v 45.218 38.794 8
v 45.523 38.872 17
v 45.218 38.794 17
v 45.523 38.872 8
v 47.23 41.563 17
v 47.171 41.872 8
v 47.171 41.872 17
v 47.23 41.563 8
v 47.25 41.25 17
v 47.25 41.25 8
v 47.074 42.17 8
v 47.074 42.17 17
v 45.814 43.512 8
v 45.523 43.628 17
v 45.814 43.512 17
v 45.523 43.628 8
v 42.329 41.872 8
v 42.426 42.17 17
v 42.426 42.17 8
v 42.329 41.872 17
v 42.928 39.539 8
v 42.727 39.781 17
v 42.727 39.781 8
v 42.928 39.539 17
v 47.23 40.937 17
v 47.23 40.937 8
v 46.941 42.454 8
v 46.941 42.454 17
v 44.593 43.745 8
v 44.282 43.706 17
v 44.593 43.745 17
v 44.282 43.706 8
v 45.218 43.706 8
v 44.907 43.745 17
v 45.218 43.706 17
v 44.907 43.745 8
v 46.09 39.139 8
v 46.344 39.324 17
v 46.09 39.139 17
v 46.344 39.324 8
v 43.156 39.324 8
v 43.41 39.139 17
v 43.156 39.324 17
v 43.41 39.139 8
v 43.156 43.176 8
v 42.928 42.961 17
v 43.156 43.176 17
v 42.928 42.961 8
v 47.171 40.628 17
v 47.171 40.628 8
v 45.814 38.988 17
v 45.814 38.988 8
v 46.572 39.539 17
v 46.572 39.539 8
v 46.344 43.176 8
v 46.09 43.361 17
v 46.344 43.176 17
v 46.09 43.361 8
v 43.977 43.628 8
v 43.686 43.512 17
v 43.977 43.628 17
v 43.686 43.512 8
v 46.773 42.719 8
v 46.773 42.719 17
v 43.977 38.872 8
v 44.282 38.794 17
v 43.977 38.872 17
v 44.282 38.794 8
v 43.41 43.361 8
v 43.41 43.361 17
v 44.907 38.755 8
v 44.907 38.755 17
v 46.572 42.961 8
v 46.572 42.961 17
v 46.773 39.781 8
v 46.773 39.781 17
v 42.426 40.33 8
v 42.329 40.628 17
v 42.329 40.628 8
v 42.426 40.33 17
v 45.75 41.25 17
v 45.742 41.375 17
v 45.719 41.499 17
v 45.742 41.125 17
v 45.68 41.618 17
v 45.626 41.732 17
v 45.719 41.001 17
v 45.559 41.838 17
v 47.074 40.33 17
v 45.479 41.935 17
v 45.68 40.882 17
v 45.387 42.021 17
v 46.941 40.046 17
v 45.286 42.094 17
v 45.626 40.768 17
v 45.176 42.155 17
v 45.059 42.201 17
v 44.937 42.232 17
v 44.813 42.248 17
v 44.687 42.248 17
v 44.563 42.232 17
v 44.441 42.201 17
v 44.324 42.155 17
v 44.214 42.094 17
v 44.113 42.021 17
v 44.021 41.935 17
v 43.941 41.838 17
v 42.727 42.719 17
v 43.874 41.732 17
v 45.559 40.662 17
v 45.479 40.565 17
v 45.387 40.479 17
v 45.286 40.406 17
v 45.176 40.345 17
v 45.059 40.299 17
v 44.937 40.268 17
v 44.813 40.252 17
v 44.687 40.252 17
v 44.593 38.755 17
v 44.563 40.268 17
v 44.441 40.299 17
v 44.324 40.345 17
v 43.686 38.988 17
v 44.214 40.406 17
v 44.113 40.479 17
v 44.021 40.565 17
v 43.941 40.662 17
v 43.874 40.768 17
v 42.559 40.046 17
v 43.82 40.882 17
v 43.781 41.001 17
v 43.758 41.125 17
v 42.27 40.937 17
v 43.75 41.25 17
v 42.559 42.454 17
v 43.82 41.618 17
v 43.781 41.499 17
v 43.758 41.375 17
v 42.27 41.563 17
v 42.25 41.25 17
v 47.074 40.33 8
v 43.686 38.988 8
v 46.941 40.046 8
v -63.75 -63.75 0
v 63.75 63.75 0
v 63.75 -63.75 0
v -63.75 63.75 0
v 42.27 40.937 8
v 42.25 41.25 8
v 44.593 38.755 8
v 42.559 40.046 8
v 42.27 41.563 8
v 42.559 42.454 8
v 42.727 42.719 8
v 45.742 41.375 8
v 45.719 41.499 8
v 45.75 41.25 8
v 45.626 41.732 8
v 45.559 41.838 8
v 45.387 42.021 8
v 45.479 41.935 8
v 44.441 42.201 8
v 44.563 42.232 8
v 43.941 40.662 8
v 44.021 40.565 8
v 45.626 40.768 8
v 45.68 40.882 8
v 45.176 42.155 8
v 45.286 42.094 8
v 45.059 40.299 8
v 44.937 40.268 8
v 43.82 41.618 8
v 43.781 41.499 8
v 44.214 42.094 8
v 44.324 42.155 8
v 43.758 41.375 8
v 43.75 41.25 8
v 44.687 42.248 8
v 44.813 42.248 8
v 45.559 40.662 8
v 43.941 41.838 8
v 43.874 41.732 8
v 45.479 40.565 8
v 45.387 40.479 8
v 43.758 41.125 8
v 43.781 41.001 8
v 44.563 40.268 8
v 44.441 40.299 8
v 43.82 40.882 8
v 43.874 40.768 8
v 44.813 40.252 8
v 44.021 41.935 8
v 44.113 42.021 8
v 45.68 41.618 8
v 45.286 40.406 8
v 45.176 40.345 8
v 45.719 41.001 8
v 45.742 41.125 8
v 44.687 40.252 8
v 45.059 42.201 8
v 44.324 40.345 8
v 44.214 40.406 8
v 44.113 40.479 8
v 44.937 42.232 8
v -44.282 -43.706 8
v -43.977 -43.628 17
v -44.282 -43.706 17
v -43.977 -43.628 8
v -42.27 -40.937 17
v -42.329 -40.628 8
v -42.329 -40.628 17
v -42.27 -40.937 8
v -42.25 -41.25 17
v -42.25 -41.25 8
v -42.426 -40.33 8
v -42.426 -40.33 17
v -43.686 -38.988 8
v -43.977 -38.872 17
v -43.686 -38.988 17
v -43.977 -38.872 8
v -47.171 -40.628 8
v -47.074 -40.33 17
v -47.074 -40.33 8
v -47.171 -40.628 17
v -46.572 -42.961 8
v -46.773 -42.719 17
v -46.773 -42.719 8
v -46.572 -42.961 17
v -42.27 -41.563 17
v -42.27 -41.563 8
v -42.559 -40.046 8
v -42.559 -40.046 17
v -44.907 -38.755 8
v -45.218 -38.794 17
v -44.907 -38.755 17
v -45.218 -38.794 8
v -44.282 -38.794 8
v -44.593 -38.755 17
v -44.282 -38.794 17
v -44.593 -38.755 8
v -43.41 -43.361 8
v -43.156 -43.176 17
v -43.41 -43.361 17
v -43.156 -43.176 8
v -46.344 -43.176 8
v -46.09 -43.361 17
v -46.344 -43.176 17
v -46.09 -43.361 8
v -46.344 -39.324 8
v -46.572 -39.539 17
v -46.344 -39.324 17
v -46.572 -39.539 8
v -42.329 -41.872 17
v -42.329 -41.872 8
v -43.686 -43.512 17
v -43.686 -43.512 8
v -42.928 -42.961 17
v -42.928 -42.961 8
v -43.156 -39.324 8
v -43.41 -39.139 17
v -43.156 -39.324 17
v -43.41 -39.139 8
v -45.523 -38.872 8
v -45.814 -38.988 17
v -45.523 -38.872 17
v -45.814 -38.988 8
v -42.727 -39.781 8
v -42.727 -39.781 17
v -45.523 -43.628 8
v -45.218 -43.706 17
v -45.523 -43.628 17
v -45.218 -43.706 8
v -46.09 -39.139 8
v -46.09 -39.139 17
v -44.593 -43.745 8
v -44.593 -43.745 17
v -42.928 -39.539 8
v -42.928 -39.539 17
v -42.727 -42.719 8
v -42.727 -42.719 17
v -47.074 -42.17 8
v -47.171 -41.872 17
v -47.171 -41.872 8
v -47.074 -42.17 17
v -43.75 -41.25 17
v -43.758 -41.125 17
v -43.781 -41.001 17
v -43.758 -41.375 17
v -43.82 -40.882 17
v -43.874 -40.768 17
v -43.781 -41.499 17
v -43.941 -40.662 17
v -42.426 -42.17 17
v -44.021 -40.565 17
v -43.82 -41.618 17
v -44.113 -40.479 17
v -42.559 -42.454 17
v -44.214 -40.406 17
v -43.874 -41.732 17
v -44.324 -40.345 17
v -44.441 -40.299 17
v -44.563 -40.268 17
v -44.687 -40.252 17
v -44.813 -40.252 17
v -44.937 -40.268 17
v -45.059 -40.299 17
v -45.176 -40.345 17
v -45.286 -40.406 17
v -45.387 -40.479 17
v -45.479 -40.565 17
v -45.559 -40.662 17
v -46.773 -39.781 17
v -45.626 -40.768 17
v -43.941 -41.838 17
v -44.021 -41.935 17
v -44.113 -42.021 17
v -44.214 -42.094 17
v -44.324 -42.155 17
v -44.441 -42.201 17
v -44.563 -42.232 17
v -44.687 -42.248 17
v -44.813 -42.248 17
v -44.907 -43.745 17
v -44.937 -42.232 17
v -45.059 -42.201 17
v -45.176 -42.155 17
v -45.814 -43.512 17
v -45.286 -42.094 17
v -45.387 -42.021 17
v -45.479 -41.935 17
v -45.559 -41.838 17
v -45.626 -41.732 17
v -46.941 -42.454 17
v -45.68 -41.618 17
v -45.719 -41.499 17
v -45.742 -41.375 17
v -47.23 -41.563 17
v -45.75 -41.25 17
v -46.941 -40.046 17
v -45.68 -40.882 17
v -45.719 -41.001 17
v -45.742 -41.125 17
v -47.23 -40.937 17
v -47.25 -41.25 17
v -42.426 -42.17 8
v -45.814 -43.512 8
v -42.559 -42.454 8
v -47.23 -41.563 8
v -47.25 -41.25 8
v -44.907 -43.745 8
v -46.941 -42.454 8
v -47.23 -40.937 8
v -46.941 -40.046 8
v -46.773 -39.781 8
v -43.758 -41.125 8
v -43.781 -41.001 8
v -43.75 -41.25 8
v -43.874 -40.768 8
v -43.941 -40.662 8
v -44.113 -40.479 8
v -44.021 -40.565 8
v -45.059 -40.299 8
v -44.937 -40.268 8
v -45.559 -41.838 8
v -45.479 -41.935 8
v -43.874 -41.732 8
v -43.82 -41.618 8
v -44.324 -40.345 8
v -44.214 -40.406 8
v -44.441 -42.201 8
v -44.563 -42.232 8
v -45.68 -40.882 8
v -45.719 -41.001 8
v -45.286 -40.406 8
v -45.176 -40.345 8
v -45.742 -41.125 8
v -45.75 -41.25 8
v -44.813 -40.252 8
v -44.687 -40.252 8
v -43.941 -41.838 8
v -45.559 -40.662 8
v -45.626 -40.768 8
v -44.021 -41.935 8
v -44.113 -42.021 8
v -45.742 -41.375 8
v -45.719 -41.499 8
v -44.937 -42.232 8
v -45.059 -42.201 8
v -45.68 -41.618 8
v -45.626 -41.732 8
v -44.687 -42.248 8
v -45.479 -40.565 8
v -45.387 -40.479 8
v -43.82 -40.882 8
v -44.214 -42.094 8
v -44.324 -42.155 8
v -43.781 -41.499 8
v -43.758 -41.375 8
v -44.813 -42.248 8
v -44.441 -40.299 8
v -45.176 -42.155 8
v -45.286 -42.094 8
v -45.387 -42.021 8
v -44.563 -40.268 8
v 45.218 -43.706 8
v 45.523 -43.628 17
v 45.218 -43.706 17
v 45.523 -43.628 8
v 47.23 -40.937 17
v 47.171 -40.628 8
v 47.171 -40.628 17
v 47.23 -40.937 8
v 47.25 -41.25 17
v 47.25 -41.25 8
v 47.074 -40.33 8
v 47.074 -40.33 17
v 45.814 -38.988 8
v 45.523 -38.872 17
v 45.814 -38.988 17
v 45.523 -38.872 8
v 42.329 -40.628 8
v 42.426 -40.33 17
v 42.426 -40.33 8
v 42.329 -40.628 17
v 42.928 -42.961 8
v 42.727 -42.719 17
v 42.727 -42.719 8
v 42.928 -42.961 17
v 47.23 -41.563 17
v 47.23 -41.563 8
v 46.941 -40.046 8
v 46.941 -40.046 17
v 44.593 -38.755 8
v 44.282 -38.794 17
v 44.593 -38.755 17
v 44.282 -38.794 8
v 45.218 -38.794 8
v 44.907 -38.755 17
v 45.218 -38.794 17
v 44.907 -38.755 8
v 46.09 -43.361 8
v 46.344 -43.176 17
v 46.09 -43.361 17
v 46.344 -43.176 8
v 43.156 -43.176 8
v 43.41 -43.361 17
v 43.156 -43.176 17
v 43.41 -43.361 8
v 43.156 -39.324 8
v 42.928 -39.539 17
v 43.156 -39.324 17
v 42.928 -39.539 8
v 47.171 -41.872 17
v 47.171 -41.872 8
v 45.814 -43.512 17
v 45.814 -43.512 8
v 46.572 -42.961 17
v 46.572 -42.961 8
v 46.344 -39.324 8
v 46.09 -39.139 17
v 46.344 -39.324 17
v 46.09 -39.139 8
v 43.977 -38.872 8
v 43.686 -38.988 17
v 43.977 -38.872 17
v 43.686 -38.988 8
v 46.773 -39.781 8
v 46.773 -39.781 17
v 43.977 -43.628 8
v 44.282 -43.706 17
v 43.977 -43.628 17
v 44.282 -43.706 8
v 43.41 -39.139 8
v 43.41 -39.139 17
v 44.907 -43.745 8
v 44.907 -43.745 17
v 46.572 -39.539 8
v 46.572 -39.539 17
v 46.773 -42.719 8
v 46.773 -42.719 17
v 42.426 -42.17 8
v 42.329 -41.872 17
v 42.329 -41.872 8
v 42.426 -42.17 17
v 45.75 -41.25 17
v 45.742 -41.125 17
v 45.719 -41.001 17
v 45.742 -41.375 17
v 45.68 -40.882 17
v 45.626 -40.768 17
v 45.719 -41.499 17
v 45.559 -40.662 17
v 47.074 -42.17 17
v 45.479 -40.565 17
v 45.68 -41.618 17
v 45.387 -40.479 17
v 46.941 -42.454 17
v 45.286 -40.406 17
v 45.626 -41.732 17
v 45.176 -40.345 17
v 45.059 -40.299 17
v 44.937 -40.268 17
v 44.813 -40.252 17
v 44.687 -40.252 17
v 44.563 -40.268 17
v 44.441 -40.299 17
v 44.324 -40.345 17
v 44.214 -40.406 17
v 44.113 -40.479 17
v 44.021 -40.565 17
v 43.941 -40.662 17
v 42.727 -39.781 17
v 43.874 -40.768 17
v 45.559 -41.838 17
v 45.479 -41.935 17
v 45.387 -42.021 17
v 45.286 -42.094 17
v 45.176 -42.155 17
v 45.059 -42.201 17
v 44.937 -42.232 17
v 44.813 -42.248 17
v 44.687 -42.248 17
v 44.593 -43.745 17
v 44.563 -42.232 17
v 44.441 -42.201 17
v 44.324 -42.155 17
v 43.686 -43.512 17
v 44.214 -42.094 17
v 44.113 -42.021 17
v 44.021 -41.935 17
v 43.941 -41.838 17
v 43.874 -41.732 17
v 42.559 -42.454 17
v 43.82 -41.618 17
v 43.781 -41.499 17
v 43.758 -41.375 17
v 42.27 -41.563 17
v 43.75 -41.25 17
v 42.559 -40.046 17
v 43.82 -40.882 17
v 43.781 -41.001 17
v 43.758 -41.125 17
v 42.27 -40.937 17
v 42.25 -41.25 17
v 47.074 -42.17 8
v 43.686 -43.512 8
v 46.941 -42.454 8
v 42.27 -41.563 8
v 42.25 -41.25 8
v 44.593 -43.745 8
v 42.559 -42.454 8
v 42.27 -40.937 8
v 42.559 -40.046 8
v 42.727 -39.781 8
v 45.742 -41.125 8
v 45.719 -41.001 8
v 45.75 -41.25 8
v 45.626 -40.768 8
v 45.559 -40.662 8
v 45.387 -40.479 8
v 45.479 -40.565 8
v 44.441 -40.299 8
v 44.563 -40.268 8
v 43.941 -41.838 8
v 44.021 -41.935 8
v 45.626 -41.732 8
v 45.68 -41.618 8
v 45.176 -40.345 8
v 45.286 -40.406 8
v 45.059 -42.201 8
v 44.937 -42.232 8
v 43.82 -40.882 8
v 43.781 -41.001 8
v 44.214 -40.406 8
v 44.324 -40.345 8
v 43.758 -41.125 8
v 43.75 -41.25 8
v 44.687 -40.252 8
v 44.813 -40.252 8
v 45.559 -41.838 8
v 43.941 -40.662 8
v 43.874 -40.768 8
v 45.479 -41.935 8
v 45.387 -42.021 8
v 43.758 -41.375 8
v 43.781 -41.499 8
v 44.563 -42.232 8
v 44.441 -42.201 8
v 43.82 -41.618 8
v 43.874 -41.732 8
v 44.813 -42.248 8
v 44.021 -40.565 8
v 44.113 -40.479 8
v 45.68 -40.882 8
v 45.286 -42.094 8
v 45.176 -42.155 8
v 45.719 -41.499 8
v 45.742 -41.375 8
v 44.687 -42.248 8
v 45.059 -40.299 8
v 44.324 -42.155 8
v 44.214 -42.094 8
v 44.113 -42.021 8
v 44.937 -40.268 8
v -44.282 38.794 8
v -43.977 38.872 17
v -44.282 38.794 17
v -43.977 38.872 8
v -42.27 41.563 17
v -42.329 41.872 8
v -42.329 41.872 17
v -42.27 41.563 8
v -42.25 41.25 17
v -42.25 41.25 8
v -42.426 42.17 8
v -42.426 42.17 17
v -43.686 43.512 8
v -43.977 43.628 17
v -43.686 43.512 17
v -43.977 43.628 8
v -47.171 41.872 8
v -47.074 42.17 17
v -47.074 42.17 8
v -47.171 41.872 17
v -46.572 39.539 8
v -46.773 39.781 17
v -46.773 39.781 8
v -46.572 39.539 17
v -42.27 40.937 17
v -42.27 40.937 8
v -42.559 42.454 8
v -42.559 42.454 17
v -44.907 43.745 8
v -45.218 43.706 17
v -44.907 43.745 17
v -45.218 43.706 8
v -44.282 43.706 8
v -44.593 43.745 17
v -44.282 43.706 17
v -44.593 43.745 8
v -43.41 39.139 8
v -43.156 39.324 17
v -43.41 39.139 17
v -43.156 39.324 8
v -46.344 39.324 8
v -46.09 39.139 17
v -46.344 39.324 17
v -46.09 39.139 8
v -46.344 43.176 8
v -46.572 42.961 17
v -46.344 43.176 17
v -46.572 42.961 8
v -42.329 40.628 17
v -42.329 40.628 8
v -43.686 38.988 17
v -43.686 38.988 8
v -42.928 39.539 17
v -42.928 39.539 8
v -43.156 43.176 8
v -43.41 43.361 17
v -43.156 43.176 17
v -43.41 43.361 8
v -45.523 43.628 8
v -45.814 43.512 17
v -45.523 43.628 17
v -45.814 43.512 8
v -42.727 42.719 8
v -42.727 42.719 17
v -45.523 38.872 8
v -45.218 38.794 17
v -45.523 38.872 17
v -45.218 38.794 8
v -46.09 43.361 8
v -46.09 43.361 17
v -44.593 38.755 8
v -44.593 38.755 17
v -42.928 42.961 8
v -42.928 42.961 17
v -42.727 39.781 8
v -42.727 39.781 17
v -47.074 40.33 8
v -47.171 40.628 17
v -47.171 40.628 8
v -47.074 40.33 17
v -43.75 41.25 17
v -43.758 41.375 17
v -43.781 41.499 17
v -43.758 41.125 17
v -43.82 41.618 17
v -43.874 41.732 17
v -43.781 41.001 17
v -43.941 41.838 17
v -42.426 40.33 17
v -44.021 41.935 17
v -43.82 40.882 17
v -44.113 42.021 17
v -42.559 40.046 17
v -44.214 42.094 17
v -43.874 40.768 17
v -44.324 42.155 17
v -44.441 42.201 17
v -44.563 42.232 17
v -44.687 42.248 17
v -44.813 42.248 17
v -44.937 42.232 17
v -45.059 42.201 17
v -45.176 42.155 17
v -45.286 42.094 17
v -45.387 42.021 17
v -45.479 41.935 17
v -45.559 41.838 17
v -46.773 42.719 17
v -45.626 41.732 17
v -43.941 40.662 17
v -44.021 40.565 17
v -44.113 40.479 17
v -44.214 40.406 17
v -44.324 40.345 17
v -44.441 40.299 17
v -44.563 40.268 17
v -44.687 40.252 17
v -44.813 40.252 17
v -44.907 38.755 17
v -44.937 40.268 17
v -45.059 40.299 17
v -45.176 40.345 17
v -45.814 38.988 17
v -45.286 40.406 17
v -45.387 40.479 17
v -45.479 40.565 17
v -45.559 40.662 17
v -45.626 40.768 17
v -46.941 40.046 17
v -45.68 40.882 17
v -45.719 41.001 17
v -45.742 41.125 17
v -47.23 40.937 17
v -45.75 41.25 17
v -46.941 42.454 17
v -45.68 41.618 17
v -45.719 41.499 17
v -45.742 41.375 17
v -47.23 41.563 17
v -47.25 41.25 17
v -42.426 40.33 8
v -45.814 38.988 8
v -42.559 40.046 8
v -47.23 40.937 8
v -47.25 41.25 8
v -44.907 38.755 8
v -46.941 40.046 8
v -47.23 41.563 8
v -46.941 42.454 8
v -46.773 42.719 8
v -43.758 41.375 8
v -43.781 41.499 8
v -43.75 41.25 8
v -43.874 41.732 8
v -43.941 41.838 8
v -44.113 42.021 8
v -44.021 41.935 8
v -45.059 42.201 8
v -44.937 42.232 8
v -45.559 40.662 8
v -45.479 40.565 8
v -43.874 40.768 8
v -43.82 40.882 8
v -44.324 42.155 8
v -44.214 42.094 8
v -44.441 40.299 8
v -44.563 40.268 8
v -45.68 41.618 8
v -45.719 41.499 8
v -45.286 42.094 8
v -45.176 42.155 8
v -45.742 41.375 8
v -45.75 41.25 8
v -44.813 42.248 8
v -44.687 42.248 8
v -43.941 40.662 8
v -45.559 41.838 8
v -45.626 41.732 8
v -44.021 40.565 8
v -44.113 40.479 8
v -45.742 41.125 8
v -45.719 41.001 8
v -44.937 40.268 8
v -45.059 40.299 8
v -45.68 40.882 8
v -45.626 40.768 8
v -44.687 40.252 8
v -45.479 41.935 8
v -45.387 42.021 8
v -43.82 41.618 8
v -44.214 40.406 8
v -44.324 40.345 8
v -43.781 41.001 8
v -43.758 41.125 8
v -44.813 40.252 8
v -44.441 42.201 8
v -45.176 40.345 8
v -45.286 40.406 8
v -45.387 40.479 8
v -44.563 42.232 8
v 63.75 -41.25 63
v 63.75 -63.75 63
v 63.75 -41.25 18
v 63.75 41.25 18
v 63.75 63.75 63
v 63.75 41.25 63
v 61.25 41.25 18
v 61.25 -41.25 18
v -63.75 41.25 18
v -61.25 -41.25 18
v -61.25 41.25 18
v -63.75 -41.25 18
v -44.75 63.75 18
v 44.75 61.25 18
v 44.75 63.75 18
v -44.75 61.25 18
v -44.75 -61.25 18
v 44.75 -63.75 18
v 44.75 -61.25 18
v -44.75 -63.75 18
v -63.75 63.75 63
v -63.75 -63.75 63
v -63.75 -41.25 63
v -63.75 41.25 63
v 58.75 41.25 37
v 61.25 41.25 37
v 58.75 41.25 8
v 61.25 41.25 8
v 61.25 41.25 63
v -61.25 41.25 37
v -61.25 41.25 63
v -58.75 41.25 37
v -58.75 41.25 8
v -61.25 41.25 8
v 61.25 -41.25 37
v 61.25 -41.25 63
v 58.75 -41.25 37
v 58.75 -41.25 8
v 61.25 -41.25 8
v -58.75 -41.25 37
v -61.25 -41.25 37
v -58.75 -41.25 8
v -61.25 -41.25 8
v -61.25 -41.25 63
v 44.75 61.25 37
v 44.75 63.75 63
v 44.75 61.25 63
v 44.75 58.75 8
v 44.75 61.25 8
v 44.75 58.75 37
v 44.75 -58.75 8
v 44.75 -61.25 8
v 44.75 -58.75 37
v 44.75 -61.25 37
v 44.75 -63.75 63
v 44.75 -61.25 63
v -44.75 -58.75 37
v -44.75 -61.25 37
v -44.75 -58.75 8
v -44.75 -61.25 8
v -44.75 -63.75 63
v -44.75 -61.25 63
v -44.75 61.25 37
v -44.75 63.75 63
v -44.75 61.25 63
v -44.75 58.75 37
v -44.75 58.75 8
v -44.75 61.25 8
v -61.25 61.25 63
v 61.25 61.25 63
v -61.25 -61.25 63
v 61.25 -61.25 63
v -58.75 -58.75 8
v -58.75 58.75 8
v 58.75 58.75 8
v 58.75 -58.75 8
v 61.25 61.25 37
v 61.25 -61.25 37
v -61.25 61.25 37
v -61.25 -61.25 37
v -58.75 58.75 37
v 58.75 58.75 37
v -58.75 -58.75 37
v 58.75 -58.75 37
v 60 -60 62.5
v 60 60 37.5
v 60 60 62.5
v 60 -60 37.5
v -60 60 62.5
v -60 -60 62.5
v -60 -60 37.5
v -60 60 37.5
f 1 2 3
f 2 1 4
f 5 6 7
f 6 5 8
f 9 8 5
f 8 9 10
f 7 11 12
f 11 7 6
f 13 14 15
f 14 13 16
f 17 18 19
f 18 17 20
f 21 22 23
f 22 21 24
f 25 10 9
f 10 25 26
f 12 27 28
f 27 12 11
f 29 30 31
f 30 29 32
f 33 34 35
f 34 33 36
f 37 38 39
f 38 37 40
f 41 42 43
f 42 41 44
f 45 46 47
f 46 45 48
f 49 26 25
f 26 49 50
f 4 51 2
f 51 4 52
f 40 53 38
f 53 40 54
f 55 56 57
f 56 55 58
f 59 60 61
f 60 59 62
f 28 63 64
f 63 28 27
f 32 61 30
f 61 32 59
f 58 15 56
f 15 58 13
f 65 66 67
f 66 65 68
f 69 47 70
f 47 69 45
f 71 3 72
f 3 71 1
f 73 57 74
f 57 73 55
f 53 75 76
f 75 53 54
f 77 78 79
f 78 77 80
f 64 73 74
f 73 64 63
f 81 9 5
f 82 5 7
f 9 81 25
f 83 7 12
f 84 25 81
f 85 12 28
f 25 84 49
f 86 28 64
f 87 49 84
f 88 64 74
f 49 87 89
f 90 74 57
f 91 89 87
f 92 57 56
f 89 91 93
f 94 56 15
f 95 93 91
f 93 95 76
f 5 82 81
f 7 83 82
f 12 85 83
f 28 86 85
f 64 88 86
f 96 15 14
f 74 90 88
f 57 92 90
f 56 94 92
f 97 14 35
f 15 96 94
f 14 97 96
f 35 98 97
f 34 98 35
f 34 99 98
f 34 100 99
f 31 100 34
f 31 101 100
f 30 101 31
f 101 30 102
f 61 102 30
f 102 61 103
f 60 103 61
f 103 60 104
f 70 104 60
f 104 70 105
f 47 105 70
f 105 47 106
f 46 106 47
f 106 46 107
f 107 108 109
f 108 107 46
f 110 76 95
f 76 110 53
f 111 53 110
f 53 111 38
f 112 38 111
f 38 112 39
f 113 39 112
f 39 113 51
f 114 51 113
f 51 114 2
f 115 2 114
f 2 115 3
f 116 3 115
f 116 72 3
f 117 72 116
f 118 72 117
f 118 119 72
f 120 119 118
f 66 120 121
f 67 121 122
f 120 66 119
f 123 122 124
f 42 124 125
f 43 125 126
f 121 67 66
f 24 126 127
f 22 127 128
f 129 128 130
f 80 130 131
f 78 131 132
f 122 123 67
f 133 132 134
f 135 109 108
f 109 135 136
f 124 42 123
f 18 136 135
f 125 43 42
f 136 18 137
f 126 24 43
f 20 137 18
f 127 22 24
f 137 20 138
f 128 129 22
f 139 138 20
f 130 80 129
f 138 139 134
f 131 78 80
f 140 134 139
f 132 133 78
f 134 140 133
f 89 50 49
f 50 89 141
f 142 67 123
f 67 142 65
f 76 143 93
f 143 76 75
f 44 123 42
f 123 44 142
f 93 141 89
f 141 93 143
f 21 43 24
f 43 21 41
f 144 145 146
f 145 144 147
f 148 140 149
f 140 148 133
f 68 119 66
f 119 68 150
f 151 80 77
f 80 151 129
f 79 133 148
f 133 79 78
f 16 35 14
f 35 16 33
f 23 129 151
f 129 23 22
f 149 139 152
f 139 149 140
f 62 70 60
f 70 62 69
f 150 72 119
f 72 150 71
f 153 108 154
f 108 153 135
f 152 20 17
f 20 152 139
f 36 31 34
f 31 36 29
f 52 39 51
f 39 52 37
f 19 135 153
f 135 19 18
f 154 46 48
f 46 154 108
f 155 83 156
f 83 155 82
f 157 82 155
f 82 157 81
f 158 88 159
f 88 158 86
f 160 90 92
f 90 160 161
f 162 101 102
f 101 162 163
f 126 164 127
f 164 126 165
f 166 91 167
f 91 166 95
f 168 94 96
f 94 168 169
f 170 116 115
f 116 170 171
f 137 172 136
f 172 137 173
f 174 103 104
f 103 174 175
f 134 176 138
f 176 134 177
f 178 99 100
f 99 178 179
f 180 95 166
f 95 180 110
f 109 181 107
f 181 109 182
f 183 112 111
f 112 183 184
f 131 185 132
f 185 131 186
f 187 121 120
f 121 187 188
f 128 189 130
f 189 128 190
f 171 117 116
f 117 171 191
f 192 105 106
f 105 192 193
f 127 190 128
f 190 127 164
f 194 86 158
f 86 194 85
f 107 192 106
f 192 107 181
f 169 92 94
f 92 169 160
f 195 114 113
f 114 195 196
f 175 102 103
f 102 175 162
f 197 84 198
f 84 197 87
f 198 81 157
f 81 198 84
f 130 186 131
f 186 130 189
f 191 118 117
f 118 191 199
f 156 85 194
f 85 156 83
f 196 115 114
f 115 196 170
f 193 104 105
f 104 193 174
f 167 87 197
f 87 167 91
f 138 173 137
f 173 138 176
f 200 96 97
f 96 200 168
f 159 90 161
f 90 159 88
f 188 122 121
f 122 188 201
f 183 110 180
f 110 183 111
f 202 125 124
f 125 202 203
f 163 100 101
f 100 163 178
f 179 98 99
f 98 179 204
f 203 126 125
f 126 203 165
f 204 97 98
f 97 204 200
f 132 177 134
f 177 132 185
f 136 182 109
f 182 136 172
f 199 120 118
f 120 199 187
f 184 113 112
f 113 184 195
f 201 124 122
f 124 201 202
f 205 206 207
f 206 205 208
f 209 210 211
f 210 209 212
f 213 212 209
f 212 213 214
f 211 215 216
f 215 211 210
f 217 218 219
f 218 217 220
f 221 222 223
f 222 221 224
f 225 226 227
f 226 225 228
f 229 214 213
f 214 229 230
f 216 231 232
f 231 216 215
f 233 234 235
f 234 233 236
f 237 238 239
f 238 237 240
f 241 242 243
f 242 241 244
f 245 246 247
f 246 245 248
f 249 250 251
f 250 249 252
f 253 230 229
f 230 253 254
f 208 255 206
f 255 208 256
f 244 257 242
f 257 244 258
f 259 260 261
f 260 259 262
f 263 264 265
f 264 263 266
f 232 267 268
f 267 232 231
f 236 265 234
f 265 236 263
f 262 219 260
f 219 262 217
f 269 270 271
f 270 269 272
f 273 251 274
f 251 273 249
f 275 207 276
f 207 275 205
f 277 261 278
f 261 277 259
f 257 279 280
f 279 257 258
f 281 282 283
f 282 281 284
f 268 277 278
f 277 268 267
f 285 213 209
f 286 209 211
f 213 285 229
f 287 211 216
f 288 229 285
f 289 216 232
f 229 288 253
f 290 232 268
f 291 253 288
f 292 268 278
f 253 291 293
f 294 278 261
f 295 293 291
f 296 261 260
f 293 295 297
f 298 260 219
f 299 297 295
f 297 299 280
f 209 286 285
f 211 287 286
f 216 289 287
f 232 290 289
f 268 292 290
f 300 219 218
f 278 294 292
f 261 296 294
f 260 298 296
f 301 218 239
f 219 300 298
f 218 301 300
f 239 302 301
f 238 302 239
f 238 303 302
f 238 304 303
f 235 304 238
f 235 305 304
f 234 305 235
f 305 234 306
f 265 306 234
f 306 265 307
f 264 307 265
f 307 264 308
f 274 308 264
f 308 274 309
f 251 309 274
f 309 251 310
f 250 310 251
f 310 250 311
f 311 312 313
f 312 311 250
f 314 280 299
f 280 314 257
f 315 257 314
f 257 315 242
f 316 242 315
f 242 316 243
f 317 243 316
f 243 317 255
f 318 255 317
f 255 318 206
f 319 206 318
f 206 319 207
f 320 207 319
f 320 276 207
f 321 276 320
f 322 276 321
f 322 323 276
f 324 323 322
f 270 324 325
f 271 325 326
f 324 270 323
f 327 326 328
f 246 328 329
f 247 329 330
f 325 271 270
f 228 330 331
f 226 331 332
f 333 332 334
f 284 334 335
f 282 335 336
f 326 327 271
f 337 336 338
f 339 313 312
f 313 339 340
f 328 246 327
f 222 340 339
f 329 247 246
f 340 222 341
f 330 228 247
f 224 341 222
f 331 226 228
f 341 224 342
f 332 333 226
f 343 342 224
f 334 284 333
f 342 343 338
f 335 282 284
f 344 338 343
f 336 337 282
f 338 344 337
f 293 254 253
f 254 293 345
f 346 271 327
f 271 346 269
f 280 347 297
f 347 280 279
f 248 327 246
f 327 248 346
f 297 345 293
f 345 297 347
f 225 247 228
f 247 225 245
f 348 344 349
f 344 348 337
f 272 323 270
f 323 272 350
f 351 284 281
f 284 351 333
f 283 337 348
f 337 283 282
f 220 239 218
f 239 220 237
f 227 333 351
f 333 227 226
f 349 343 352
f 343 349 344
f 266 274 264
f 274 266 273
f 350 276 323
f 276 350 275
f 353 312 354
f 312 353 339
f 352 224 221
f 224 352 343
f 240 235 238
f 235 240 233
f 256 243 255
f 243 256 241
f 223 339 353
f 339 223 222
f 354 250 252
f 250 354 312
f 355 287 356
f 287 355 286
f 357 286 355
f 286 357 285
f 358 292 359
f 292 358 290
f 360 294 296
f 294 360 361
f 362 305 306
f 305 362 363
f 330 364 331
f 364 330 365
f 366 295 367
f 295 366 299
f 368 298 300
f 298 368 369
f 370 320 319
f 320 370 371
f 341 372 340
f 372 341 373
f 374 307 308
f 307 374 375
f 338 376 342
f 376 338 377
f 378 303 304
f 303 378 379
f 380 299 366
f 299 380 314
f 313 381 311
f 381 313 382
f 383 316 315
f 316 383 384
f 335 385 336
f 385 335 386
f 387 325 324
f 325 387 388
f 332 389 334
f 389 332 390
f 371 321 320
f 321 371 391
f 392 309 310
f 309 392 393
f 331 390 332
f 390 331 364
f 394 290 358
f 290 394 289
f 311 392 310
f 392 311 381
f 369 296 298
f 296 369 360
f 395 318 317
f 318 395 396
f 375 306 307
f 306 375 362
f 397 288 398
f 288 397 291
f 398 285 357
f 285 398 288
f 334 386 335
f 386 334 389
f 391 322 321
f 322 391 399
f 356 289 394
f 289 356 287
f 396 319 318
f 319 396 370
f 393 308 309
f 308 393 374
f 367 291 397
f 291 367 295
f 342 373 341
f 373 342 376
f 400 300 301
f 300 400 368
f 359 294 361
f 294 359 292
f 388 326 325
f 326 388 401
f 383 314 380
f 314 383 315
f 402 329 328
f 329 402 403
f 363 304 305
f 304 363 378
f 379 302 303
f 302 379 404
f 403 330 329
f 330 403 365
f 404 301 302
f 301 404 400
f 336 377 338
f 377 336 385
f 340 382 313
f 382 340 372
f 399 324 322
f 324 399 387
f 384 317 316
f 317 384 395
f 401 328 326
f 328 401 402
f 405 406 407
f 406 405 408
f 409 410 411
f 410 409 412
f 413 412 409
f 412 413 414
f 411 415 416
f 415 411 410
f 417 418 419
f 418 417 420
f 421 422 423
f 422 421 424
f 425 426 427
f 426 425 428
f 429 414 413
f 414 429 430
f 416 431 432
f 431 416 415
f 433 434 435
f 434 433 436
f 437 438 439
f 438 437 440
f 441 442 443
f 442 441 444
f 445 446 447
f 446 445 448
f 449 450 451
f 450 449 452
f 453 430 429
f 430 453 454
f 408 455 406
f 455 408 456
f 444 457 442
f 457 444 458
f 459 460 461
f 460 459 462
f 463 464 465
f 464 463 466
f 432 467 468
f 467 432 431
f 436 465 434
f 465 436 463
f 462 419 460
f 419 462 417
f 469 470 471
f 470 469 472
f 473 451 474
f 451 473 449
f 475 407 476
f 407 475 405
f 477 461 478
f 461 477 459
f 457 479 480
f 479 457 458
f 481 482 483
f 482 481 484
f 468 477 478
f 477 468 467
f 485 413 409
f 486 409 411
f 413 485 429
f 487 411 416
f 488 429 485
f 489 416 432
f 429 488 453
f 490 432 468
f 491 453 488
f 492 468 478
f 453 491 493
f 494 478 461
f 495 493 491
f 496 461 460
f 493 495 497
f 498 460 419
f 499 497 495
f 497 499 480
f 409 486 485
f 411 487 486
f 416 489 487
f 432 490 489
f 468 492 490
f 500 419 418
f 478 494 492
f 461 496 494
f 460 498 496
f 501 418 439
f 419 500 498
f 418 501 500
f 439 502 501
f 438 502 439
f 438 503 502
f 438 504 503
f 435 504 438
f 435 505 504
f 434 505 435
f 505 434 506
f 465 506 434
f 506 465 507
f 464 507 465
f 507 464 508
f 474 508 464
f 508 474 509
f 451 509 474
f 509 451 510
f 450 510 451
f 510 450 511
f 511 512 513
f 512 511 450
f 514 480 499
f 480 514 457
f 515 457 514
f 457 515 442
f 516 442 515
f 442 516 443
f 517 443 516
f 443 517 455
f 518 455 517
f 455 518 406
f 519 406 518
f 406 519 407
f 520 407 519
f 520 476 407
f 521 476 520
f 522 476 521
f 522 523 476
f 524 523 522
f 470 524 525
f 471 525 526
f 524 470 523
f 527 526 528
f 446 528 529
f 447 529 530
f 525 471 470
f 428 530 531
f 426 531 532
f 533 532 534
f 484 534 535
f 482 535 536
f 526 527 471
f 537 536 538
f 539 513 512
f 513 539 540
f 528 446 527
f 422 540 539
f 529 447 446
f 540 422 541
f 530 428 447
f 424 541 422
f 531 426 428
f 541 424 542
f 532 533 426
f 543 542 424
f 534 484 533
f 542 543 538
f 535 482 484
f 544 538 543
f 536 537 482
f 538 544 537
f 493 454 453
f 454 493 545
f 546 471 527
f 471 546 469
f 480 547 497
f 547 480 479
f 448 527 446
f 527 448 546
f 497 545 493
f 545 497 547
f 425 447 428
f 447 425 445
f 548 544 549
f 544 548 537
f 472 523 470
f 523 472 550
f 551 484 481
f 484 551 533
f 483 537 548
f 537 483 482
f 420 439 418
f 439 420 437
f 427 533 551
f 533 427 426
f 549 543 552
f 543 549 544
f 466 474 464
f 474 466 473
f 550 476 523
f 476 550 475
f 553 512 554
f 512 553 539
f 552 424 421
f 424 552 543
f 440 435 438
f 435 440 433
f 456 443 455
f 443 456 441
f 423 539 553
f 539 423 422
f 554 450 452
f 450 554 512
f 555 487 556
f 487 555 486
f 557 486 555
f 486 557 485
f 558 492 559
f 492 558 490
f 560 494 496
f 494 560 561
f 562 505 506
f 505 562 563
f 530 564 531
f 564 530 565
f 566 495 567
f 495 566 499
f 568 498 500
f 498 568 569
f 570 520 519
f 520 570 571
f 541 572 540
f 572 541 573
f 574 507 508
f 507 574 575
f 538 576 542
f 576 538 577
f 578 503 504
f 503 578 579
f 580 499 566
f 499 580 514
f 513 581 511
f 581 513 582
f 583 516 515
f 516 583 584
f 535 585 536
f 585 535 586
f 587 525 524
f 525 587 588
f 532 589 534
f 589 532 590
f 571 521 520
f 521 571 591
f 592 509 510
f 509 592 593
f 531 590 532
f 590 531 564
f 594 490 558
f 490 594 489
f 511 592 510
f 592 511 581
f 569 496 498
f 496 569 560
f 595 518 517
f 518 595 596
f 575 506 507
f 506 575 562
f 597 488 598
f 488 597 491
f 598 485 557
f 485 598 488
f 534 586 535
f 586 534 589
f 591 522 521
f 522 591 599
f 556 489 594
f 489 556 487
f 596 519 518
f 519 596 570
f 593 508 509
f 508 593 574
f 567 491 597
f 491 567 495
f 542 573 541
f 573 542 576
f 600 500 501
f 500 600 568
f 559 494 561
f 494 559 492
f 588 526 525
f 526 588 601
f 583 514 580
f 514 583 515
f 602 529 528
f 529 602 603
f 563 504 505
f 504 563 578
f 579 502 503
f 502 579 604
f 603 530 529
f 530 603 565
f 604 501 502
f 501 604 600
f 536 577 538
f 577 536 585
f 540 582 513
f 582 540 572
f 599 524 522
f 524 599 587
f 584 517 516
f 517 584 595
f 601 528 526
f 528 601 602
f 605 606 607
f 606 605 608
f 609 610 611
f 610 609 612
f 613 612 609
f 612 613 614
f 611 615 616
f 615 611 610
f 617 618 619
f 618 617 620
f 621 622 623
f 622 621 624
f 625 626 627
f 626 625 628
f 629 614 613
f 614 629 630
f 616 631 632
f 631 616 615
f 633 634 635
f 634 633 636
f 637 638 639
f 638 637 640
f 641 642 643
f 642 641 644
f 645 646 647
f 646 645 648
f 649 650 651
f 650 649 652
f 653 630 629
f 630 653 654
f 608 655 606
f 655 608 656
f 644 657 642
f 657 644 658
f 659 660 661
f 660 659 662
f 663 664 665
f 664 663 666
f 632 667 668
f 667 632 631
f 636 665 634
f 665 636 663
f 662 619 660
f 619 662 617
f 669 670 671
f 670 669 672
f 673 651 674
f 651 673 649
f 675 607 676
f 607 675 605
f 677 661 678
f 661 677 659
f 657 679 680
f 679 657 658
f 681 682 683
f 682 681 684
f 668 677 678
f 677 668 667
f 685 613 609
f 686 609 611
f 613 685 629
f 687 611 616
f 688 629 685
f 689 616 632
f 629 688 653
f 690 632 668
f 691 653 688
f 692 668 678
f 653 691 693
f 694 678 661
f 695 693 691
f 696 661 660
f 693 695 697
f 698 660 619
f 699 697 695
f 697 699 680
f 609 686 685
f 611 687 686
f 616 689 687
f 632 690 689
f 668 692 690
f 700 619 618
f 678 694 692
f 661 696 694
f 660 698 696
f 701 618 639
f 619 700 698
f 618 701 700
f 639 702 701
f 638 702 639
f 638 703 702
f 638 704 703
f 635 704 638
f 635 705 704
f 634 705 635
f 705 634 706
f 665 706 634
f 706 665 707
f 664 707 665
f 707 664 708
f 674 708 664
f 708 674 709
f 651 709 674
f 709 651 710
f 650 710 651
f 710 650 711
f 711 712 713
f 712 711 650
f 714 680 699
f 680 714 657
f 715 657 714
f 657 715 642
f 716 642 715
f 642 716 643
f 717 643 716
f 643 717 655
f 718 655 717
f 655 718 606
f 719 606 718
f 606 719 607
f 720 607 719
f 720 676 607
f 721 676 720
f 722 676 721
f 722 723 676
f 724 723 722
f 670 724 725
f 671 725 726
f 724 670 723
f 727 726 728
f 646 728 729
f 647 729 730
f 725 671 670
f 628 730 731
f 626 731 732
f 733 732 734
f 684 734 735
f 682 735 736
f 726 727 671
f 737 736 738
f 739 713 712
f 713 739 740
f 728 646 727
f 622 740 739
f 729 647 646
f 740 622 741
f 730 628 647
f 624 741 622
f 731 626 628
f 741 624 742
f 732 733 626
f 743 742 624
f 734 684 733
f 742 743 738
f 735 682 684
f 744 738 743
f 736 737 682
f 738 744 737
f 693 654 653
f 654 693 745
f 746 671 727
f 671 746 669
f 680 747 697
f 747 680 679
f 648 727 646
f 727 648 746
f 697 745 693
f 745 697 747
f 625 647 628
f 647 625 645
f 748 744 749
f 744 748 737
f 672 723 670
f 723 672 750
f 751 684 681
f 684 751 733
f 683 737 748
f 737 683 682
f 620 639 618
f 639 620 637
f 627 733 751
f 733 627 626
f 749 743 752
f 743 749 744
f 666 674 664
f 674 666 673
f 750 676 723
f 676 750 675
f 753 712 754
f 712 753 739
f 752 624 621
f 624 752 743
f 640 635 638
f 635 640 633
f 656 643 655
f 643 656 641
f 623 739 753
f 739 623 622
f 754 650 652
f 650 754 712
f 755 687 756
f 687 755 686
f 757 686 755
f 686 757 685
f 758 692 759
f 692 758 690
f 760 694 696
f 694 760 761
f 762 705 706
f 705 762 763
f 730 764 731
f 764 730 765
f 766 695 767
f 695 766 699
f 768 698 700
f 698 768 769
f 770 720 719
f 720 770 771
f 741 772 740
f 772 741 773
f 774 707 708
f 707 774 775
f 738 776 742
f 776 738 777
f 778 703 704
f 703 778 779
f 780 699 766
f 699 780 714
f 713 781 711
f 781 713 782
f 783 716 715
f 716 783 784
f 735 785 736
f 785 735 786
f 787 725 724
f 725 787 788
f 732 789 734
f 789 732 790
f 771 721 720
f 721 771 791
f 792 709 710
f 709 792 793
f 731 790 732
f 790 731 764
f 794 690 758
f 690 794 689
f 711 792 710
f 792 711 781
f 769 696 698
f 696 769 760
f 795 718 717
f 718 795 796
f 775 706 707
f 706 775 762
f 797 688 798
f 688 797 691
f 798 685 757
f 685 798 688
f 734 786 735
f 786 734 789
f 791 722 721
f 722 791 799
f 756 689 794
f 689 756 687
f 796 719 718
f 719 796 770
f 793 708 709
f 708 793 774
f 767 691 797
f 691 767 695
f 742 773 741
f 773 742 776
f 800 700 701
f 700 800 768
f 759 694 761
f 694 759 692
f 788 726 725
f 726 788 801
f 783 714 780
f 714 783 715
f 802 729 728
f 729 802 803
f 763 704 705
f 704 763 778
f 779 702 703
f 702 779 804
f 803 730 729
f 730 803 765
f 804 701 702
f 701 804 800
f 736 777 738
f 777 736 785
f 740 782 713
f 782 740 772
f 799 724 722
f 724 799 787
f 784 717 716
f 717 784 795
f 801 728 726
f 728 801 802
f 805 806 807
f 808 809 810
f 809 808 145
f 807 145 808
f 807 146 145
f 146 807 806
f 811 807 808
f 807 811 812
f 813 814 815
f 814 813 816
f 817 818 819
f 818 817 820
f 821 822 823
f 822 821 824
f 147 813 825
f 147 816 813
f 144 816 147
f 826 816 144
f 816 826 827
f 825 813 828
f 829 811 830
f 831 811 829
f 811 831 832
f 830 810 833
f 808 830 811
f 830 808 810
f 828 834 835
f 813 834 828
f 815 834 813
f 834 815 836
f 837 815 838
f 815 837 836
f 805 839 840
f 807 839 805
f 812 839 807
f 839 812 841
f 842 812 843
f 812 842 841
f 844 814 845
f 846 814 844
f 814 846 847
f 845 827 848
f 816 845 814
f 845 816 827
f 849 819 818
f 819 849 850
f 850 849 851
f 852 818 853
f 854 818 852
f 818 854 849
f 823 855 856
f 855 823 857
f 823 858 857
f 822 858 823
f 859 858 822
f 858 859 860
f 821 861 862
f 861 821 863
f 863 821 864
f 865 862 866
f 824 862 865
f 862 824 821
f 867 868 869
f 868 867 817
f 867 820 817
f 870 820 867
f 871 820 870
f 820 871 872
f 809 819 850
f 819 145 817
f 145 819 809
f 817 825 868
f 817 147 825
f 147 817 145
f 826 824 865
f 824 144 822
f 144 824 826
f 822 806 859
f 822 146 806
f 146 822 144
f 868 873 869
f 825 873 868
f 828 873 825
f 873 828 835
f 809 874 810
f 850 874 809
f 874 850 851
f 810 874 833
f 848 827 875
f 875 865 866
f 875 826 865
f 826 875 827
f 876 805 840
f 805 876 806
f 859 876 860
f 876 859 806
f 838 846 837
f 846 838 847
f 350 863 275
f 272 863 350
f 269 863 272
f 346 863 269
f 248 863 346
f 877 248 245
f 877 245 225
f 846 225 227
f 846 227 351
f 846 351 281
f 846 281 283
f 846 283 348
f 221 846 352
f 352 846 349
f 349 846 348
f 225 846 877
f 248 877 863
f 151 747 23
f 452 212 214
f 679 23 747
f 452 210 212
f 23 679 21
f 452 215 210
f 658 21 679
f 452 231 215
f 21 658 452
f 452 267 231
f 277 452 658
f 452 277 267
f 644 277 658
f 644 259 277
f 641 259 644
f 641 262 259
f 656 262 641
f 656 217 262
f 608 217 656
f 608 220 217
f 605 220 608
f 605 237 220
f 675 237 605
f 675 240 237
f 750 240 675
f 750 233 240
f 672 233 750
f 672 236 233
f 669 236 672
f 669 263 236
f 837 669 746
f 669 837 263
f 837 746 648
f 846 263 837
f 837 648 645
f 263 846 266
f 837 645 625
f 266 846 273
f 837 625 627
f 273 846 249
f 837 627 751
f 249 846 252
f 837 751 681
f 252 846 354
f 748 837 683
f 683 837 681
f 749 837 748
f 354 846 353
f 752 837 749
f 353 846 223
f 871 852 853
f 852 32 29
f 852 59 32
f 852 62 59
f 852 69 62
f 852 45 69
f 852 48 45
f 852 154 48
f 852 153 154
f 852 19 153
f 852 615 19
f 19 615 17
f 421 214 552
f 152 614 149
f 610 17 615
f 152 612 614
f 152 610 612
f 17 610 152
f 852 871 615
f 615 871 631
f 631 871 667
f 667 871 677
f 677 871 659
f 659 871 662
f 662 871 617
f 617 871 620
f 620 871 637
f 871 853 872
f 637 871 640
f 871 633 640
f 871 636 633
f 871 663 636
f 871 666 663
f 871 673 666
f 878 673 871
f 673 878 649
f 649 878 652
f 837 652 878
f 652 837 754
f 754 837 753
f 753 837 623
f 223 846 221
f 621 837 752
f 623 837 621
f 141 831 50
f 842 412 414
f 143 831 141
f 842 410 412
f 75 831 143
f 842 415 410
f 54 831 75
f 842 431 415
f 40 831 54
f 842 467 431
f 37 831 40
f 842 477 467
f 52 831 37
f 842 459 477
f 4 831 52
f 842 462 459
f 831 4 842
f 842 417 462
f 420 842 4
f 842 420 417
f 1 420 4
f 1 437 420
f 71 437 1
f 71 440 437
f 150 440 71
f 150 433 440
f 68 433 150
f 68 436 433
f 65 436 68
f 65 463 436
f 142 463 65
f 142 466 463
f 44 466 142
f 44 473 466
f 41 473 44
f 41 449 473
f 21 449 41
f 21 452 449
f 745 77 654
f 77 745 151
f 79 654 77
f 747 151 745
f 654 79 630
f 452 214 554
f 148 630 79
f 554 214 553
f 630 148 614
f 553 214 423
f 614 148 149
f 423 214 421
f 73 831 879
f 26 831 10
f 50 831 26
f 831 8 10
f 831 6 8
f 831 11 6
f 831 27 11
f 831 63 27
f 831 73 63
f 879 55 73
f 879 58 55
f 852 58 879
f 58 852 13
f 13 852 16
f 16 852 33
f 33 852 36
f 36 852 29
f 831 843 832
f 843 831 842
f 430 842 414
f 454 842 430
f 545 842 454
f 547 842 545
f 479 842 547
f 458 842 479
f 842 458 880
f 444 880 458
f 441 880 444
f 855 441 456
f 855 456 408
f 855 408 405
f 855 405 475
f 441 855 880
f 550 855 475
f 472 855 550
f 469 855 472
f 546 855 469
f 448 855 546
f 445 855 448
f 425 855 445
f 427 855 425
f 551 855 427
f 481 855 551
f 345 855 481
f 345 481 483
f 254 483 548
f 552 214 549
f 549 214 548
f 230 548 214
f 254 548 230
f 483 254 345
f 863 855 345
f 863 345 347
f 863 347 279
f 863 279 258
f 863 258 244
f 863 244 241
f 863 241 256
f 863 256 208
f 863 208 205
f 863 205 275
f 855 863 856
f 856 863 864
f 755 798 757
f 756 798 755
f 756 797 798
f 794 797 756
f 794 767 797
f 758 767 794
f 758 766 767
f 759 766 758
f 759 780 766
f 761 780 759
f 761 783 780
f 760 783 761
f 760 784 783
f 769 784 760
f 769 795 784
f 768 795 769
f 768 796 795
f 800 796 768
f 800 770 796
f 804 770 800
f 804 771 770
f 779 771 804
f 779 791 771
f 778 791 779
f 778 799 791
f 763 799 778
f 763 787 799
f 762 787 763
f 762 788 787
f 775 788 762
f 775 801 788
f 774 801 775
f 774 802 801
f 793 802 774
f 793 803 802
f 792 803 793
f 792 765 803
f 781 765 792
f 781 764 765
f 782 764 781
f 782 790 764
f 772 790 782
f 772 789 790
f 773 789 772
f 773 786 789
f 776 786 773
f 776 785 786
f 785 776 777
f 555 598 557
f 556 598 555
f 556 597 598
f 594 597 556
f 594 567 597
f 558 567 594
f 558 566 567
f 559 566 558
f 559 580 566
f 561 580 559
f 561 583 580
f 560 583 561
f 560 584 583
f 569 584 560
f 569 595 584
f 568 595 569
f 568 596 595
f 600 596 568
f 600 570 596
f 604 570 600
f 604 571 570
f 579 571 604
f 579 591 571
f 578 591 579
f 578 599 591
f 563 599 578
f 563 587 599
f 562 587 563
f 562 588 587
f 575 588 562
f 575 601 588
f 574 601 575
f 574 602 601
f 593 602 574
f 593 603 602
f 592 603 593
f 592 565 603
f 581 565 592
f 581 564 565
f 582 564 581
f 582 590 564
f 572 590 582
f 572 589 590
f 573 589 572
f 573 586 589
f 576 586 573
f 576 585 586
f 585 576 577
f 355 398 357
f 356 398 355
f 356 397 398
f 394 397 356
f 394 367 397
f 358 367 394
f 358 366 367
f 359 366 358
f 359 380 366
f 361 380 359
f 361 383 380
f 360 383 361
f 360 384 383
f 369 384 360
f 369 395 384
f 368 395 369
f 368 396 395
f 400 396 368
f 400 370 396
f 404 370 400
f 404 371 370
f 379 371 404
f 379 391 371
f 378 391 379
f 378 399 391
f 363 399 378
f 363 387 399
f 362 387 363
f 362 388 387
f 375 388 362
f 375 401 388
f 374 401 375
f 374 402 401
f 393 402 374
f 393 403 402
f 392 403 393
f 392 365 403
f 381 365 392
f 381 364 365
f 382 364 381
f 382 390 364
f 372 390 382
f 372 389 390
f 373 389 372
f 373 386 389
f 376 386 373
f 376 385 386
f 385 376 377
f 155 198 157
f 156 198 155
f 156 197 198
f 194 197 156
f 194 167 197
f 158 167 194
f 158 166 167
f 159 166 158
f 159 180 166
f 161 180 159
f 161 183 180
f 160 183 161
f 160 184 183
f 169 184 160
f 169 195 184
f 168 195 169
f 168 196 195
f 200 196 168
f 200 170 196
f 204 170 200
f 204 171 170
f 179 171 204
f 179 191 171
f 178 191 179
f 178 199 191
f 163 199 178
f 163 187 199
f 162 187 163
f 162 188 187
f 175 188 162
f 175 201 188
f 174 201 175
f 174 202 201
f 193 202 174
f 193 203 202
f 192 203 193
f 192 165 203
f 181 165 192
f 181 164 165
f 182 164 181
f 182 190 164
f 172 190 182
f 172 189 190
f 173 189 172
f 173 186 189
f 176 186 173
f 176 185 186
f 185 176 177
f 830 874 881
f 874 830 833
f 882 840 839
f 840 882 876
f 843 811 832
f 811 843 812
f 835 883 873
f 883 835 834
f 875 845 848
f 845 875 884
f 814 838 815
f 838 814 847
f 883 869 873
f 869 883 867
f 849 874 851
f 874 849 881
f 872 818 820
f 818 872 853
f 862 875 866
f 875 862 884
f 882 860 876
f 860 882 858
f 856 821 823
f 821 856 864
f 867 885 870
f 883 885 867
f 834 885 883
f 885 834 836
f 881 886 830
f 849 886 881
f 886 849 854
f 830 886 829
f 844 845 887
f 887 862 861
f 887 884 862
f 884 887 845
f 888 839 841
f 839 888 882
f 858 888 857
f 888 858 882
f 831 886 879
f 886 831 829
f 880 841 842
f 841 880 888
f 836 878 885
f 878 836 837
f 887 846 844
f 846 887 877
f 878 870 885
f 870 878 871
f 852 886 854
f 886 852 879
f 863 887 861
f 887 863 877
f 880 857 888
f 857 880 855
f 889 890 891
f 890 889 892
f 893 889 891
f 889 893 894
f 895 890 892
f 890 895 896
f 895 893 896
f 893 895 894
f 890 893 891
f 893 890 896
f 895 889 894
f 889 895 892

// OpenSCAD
$fn = 50;

module aligned_cube( size, align = [ 0, 0, 0 ] )
 translate(size/2*[[align[0],0,0],[0,align[1],0],[0,0,align[2]]])
  cube( size, center = true );
  
base = [127.5, 127.5, 8];
wall = [base.x, base.y, 55];
wall_thickness = 5;
hole_spacing = [89.5/2, 82.5/2];
hole_inner = 2;
hole_outer = 5;
post_height = 17;
fan = [120, 120, 25];
wall_slot_height = 10;
wall_slot_size = 80;
ledge_height = post_height + 17.5;
ledge_depth = 5;

// mounting posts
translate(hole_spacing) {
    difference() {
        cylinder(h = post_height, d = hole_outer);
        cylinder(h = post_height, d = hole_inner);
    }
}

translate(-hole_spacing) {
    difference() {
        cylinder(h = post_height, d = hole_outer);
        cylinder(h = post_height, d = hole_inner);
    }
}

translate([hole_spacing.x, -hole_spacing.y]) {
    difference() {
        cylinder(h = post_height, d = hole_outer);
        cylinder(h = post_height, d = hole_inner);
    }
}

translate([-hole_spacing.x, hole_spacing.y]) {
    difference() {
        cylinder(h = post_height, d = hole_outer);
        cylinder(h = post_height, d = hole_inner);
    }
}


// base
aligned_cube(base, align = [0, 0, 1]);

// walls
translate([0, 0, base.z]) {
    difference() {
        aligned_cube(wall, align = [0, 0, 1]);
        aligned_cube([wall.x - wall_thickness, 
              wall.y - wall_thickness, 
              wall.z], 
              align = [0, 0, 1]);
        // wall slot/cutout
        translate([0, 0, wall_slot_height]) {
        aligned_cube([base.x, hole_spacing.y * 2, wall_slot_size], align = [0, 0, 1]);
        aligned_cube([hole_spacing.x * 2, base.y, wall_slot_size], align = [0, 0, 1]);
        }
    }
}

// fan ledge
difference() {
    aligned_cube([wall.x, wall.y, post_height + 20], align = [0, 0, 1]);
    aligned_cube([wall.x - wall_thickness - ledge_depth, 
          wall.y - wall_thickness - ledge_depth, 
          post_height + 20], 
          align = [0, 0, 1]);
    aligned_cube([base.x, hole_spacing.y * 2, wall_slot_size], align = [0, 0, 1]);
    aligned_cube([hole_spacing.x * 2, base.y, wall_slot_size], align = [0, 0, 1]);
}

// fan
translate([0, 0, 50]) {
#cube(fan, center = true);
}
